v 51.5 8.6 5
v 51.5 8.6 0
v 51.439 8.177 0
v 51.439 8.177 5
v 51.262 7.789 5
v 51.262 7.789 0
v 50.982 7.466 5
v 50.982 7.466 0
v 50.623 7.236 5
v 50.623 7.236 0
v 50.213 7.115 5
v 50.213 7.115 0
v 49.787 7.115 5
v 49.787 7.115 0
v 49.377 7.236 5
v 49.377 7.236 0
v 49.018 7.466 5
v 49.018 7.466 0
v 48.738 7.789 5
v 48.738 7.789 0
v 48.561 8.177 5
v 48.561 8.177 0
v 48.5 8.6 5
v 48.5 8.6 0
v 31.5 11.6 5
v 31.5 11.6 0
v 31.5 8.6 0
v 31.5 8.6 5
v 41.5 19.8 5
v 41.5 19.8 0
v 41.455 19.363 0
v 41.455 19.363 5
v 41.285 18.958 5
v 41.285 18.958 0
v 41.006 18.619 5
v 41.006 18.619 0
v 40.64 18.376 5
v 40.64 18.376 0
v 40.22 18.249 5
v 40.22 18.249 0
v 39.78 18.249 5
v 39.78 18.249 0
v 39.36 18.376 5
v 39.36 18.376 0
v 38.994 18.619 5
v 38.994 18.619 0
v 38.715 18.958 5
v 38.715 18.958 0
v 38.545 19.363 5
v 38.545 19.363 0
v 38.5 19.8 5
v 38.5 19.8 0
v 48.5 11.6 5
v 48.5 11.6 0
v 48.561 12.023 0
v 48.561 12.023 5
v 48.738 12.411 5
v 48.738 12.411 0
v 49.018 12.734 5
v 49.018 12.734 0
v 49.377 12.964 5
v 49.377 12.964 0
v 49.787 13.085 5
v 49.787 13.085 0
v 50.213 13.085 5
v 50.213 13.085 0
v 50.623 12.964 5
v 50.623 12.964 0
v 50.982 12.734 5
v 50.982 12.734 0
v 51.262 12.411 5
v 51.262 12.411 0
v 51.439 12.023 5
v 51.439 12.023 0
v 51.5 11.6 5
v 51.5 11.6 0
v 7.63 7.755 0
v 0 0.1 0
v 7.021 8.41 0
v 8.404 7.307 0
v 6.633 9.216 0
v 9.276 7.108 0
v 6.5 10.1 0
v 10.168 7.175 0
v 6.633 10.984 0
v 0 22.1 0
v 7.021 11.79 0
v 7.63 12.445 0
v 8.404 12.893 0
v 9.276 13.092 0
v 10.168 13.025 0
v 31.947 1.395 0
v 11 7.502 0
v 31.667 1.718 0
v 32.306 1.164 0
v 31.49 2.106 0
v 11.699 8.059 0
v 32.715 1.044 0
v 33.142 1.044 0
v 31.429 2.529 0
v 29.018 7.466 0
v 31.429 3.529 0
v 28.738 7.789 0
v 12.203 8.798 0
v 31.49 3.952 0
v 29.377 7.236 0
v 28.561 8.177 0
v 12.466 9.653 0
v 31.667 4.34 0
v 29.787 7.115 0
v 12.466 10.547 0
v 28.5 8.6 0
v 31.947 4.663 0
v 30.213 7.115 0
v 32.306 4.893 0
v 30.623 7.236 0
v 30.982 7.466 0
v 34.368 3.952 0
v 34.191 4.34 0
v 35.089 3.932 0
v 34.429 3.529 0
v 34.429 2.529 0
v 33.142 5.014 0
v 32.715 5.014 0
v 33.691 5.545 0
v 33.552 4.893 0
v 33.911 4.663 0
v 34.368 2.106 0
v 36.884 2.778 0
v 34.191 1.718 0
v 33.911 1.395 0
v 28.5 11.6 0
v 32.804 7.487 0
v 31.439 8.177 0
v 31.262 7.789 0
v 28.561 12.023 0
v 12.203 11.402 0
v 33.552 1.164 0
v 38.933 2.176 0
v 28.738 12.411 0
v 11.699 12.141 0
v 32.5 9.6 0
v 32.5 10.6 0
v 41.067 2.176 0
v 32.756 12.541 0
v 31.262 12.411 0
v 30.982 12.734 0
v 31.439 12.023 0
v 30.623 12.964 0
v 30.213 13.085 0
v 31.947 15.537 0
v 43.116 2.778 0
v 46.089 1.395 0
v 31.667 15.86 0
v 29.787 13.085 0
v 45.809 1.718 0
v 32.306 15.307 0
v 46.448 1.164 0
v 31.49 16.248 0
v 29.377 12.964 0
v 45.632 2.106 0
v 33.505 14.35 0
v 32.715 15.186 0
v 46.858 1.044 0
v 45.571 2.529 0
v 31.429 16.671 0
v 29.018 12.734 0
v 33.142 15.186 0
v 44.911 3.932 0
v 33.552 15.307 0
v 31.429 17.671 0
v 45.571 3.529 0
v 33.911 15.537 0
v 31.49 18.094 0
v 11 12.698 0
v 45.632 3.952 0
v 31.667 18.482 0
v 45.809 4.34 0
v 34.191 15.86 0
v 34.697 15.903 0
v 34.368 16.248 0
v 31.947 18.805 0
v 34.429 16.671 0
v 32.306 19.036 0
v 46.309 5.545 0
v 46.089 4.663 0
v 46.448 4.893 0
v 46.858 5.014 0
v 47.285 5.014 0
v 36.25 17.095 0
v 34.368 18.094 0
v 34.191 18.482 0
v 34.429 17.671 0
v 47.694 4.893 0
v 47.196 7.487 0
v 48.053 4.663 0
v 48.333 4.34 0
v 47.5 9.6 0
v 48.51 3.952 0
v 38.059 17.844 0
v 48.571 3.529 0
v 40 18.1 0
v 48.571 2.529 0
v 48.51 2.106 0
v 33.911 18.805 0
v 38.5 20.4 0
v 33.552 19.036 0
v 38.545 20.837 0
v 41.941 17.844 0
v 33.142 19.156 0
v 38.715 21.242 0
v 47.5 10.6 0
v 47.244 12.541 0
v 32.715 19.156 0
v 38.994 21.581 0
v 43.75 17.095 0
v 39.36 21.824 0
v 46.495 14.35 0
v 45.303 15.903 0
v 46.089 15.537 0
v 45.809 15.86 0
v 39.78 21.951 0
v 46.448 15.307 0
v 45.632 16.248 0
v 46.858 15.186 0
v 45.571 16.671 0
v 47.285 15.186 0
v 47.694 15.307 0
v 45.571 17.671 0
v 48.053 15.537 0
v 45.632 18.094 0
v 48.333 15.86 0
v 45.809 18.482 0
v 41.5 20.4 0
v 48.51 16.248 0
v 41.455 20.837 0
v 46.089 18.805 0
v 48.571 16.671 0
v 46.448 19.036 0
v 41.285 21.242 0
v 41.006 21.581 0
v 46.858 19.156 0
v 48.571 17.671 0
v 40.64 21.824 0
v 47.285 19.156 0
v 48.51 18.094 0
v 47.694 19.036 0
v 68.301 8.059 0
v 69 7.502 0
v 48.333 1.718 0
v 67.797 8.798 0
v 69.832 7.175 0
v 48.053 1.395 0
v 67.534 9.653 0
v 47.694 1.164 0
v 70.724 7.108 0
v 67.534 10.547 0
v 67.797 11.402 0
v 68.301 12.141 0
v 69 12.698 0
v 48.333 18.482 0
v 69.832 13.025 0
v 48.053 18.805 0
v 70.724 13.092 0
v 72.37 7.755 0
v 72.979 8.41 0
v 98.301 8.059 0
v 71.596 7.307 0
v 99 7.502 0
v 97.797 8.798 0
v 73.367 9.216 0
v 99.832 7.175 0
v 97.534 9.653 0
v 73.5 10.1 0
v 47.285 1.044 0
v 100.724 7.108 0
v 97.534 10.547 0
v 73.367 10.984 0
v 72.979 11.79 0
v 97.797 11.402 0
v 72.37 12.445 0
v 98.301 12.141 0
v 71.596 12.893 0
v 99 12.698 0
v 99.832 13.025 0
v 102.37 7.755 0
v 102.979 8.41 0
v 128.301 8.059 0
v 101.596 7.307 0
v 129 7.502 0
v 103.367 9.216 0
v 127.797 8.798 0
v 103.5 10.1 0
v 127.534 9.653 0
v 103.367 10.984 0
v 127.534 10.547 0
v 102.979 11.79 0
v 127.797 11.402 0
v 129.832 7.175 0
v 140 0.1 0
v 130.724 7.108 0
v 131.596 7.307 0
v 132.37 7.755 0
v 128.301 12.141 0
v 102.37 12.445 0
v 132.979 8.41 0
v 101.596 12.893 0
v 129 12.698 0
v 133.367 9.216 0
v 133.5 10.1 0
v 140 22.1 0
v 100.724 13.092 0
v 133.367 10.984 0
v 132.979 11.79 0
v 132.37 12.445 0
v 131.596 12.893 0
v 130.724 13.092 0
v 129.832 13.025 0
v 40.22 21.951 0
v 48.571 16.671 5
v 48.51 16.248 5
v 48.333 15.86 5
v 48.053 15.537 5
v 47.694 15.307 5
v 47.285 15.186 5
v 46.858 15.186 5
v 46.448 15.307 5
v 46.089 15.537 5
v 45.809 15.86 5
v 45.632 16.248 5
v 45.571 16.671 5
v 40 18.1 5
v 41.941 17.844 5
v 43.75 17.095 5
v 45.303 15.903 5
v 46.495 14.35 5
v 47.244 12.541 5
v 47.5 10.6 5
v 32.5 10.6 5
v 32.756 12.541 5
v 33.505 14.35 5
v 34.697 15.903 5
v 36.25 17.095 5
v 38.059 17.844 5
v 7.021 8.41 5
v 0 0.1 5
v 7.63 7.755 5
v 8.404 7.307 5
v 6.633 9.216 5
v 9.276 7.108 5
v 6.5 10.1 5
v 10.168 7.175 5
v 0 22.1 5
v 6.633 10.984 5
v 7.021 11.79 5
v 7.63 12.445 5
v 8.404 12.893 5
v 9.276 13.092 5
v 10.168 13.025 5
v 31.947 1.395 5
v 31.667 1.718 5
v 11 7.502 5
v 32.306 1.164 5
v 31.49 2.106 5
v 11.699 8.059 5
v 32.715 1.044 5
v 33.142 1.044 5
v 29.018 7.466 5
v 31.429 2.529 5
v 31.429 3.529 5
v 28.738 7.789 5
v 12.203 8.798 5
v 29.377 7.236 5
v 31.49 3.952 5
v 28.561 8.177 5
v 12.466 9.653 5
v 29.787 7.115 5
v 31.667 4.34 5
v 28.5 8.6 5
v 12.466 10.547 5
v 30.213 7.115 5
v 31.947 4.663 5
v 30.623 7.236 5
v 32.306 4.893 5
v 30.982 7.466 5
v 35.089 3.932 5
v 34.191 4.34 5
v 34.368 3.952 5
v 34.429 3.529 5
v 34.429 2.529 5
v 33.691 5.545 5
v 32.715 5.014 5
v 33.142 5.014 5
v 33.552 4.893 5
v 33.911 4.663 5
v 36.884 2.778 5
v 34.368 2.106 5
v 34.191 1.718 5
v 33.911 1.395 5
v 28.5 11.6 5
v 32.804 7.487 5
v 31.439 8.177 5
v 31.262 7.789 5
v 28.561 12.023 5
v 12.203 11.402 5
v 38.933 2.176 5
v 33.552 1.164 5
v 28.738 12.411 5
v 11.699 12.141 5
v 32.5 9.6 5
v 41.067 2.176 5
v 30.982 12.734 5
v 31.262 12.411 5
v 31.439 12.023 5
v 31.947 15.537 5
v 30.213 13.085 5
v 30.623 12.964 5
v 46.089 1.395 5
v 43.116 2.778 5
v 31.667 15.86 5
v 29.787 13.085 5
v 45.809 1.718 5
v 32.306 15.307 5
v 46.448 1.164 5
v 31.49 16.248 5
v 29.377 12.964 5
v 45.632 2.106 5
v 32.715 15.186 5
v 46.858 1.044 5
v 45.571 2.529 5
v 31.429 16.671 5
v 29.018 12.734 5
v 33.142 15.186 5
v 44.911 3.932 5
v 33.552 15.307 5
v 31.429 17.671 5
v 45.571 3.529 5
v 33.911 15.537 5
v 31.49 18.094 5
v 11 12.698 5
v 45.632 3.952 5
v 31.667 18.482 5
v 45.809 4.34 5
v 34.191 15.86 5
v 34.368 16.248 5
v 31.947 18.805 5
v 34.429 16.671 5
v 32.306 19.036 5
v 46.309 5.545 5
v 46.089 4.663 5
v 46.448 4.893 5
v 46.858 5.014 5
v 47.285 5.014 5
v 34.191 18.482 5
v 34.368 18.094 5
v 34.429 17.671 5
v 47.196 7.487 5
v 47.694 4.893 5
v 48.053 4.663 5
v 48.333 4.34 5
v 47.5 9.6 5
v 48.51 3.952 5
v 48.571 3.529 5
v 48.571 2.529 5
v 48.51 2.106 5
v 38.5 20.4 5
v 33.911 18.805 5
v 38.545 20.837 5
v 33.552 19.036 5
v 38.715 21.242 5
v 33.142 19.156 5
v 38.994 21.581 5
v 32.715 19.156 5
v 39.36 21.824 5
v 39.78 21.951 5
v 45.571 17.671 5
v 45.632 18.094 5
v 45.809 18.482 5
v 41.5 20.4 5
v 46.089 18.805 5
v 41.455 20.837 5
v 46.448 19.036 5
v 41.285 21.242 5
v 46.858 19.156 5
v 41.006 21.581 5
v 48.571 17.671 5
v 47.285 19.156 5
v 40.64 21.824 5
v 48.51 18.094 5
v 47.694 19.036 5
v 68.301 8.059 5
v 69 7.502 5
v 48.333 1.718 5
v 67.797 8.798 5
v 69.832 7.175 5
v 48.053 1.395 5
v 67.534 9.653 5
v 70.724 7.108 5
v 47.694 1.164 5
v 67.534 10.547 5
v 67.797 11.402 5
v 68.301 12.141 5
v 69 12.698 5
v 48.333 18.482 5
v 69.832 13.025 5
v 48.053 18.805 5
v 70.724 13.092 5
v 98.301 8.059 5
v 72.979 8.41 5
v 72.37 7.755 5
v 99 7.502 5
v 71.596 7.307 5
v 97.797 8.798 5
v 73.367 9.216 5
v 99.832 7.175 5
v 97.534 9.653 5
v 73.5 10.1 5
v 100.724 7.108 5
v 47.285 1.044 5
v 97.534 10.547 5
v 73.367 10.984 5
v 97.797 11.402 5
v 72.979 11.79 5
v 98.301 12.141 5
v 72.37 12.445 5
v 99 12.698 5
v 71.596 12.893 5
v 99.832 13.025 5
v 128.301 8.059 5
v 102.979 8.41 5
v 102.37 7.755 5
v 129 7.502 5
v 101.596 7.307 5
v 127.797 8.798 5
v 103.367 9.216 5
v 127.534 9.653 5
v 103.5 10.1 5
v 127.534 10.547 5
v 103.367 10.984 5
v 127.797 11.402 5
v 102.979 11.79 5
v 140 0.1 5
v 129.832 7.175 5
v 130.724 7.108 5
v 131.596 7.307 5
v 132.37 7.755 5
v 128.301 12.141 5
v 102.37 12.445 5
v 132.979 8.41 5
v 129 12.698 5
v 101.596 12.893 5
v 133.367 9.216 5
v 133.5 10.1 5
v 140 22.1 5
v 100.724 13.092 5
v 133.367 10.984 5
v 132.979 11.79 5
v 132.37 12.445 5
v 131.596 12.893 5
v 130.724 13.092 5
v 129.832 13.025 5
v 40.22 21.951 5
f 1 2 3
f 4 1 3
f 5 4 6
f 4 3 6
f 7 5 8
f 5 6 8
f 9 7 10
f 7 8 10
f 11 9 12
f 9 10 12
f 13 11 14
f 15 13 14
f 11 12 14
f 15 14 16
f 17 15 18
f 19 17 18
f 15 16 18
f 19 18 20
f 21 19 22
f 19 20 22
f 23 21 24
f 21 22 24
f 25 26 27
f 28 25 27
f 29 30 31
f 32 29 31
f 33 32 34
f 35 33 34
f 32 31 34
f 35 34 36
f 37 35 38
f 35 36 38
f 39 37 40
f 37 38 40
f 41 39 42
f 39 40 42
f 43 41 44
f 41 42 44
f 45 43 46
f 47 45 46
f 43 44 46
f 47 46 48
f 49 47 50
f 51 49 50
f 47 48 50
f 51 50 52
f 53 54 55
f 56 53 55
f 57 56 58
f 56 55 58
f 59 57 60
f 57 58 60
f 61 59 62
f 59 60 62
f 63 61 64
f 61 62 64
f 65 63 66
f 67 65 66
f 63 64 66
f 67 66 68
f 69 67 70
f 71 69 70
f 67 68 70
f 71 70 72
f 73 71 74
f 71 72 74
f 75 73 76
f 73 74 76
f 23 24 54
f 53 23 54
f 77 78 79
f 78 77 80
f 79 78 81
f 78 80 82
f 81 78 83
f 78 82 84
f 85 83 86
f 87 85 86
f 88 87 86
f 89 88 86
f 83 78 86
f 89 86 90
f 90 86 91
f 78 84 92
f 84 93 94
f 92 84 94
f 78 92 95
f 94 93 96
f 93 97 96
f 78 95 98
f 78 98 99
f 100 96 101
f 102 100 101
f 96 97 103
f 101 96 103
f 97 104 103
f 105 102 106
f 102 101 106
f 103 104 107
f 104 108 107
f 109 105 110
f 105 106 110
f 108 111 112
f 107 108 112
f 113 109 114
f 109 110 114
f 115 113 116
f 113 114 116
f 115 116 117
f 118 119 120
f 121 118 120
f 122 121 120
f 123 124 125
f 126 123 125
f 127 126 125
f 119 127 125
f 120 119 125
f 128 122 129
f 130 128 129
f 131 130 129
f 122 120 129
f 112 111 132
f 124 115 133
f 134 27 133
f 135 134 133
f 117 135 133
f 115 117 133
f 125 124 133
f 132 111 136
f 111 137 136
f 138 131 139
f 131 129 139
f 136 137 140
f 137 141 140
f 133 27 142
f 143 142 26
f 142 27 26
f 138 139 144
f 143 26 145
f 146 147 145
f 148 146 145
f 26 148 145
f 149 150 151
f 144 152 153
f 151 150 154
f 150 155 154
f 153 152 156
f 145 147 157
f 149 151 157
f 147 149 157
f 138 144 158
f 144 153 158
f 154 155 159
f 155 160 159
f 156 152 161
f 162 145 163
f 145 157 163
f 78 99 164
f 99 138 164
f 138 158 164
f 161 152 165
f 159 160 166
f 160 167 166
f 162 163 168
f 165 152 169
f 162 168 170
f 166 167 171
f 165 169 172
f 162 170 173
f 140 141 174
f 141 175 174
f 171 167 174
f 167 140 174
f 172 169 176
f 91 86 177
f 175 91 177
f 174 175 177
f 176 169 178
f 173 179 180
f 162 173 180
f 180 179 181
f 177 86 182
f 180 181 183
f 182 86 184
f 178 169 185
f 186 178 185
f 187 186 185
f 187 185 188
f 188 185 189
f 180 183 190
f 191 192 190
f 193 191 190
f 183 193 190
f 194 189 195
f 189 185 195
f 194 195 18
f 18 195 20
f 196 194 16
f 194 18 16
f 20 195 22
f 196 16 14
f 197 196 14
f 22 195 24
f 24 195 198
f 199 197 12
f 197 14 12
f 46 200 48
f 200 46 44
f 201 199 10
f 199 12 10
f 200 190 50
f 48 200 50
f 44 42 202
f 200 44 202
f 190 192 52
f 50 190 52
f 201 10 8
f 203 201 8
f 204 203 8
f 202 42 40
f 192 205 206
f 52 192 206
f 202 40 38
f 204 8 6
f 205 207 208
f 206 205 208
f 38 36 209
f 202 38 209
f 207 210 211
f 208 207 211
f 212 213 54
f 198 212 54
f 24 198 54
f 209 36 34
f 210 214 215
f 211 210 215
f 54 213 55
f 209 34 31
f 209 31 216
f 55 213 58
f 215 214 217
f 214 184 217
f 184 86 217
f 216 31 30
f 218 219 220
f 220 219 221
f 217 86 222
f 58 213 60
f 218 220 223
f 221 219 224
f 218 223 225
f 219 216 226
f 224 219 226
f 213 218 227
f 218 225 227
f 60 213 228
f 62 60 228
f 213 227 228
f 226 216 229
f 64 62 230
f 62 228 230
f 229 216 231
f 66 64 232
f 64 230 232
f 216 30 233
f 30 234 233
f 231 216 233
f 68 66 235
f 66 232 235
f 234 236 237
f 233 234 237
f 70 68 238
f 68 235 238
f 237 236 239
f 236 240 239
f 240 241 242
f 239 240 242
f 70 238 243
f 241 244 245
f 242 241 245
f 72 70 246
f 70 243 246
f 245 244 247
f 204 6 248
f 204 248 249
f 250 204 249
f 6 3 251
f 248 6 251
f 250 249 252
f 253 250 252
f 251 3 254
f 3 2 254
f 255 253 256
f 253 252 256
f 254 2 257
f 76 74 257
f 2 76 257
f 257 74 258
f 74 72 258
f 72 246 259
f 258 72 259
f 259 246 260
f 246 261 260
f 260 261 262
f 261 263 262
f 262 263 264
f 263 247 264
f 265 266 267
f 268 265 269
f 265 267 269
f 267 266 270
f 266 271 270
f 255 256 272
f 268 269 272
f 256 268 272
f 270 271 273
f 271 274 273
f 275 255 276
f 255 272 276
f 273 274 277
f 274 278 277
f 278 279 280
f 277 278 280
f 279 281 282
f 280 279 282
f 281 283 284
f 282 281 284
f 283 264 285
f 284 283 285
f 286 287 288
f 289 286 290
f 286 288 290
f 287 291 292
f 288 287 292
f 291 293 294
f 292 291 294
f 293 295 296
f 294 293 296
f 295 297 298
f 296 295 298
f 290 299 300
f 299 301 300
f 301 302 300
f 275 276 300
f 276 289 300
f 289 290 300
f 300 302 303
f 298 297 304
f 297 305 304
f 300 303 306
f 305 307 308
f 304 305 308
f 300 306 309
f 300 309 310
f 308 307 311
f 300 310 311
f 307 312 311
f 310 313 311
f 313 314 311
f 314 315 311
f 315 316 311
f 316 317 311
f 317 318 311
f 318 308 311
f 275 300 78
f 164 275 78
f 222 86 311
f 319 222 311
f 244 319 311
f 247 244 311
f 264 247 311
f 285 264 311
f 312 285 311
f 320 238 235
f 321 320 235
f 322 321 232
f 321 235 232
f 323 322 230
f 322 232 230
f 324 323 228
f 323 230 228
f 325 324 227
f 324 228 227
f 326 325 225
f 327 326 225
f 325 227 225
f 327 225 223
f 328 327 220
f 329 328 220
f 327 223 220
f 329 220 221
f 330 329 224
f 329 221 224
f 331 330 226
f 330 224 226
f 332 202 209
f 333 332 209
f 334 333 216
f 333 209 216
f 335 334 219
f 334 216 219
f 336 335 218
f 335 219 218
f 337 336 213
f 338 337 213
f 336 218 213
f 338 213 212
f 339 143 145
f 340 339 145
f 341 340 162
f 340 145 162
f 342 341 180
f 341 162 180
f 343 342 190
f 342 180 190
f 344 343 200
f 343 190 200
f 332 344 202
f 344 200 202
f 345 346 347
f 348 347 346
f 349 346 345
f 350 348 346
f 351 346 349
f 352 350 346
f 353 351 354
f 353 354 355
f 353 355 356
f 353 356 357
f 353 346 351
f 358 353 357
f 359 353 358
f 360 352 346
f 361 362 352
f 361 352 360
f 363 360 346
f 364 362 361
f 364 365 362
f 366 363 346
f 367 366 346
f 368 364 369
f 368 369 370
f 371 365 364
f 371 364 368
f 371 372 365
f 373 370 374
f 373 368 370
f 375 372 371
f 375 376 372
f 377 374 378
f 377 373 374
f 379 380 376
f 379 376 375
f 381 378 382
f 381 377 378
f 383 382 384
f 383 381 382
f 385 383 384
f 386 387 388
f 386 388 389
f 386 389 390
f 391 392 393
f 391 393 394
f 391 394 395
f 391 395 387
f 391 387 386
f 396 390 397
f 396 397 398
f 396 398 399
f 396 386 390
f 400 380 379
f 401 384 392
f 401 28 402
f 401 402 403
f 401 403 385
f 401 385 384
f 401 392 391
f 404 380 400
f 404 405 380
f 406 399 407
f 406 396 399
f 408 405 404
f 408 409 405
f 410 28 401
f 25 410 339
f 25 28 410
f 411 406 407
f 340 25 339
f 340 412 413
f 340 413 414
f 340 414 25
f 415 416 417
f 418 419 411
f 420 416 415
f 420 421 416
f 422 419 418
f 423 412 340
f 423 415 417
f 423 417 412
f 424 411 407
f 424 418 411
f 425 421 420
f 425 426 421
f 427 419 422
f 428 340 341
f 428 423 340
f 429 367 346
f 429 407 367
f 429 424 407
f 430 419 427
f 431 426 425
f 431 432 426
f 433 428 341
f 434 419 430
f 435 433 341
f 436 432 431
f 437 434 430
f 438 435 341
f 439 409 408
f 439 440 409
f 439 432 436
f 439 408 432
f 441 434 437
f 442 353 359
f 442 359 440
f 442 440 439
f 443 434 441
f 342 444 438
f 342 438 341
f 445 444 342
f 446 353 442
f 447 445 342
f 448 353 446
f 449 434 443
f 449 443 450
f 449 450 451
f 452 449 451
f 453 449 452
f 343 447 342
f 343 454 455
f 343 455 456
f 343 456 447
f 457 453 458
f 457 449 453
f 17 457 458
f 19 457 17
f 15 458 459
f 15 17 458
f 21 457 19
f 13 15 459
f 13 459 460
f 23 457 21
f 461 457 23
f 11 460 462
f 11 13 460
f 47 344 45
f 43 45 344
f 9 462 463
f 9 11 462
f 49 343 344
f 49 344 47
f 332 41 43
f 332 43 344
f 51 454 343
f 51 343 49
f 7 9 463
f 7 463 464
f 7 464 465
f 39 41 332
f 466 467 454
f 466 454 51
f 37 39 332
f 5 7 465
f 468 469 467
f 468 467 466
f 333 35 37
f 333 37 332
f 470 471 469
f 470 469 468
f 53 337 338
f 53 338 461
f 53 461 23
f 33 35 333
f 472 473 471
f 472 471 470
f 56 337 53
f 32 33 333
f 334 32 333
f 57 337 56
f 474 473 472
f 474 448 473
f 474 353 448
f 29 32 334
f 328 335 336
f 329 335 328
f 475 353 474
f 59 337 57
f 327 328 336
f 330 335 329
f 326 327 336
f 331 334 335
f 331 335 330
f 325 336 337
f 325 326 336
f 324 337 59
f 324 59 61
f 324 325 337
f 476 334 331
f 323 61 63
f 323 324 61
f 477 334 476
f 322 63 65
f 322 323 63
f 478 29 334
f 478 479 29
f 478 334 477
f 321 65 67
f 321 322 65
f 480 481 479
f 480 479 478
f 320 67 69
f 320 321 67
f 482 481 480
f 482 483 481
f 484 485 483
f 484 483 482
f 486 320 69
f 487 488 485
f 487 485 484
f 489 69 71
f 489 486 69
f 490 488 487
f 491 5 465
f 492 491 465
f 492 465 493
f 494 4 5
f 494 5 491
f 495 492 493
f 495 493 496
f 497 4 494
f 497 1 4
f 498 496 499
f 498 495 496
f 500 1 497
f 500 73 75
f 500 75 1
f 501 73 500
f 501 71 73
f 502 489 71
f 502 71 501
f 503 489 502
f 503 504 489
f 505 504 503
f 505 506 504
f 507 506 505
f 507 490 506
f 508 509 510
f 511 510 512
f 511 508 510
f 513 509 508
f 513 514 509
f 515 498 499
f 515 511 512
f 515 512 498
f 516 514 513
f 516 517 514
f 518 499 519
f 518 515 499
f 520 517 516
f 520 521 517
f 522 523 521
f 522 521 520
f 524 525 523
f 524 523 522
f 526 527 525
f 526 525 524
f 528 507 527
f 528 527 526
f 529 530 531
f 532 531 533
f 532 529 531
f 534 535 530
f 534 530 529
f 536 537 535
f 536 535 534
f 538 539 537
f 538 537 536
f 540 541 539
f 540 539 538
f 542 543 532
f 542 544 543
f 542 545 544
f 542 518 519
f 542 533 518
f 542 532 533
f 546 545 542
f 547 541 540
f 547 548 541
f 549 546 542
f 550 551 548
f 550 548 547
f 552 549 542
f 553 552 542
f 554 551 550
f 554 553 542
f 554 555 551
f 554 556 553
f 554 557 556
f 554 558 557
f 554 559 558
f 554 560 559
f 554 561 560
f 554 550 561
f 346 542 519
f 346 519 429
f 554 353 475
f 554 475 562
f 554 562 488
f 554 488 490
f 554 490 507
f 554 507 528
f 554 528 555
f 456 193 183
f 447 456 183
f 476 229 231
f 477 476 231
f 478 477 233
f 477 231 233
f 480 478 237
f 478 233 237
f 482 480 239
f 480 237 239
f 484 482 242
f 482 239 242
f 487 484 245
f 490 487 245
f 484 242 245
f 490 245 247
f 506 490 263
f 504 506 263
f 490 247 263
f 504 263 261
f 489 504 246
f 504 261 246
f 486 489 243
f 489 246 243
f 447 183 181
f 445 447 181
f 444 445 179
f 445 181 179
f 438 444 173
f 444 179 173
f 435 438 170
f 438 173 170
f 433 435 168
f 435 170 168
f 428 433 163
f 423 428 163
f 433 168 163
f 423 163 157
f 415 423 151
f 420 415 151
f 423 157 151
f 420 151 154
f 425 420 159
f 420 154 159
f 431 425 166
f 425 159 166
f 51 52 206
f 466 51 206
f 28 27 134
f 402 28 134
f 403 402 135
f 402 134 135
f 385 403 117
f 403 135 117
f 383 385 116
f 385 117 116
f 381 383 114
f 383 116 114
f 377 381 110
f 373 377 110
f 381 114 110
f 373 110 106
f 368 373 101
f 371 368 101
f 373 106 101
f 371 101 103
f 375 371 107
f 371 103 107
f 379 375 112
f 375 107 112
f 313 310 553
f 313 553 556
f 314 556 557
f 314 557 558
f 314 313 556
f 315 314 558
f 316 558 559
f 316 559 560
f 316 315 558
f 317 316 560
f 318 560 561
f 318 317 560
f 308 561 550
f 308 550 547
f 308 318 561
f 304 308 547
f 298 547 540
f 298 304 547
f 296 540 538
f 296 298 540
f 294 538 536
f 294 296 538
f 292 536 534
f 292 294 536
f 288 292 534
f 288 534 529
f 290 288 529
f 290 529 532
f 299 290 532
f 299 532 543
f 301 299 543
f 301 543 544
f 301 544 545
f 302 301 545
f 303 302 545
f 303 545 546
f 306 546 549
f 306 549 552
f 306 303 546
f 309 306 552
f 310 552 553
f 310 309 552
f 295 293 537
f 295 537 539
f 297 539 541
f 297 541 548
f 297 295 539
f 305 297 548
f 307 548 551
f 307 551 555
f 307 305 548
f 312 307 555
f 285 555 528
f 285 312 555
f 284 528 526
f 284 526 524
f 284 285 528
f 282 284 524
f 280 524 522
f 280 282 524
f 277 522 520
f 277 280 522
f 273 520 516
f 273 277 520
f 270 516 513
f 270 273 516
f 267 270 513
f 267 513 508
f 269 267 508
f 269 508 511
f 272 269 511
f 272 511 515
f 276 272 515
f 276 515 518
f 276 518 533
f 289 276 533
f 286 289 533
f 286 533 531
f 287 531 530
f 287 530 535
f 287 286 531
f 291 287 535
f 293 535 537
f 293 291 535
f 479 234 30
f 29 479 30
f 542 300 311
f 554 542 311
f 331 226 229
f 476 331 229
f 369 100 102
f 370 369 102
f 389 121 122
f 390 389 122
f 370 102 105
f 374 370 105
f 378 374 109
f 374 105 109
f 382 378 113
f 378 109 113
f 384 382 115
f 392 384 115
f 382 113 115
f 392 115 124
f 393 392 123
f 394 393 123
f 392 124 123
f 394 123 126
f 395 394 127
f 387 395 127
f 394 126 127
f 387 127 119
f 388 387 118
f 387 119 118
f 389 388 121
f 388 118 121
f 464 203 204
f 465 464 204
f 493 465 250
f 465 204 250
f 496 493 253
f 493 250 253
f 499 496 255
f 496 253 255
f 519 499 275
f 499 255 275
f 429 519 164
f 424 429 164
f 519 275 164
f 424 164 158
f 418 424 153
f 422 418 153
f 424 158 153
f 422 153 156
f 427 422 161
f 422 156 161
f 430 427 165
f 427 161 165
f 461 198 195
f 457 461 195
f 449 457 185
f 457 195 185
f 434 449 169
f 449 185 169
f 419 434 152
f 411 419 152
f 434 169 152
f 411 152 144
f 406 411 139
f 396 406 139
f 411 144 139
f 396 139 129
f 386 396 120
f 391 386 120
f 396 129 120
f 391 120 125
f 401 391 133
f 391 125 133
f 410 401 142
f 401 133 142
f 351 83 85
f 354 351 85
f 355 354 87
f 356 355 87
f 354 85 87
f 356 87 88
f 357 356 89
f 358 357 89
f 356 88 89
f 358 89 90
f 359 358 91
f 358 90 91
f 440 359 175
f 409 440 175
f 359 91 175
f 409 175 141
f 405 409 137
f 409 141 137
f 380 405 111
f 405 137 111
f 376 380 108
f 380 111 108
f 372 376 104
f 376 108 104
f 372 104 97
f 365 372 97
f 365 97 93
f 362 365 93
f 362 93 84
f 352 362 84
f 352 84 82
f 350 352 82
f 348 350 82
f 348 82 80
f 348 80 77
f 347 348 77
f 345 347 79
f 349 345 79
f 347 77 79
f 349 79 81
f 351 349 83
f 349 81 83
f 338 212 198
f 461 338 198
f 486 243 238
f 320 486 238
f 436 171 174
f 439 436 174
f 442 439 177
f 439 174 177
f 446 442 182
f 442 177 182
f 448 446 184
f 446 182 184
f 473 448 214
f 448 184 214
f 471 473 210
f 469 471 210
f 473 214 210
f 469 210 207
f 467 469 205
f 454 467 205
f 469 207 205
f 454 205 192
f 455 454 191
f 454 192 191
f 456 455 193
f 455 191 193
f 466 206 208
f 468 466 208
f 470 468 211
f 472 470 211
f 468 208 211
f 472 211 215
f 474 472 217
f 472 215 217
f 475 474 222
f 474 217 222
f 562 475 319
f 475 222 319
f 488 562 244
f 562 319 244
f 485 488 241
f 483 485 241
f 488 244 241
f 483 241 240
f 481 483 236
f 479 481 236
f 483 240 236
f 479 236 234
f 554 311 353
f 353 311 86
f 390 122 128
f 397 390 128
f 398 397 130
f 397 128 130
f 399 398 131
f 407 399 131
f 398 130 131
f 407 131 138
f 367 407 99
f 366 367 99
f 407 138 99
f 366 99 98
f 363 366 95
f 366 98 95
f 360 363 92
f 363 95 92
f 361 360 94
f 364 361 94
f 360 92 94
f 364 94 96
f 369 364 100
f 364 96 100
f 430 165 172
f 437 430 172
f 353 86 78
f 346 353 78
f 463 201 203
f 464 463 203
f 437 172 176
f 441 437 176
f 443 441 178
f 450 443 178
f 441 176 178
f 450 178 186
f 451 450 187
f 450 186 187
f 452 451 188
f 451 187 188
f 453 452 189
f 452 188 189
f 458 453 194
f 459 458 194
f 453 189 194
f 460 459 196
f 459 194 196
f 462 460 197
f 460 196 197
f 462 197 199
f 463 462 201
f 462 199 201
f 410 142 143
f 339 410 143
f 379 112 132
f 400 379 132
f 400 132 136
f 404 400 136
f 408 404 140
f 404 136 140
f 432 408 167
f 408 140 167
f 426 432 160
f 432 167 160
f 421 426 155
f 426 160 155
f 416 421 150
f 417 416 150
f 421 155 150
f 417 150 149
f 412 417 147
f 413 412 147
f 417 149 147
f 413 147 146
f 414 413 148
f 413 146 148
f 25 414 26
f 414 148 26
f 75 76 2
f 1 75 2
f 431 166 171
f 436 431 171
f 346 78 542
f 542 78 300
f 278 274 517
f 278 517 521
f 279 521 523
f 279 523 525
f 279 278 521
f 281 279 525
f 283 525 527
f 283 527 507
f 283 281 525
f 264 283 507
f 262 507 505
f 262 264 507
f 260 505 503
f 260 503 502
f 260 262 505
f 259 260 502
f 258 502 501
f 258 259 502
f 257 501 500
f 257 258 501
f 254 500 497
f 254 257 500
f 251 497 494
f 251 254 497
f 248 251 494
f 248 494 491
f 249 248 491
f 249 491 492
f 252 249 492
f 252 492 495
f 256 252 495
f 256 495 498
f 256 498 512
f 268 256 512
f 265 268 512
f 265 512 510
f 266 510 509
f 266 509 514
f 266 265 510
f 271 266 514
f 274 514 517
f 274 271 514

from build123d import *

# Parameters (mm, degrees)
SKETCH_1_R      = 3
EXTRUDE_1_DEPTH = 5


with BuildPart() as part:
    # 스케치1 → 보스-돌출1 (new body)
    with BuildSketch(Plane.XY):
        Polygon((0, 22.1), (0, 10.1), (0, 0.1), (140, 0.1), (140, 10.1), (140, 22.1), align=None)
        with BuildLine():
            Line((31.428932188, 2.528932188), (31.428932188, 3.028932188))
            Line((31.428932188, 3.028932188), (31.428932188, 3.528932188))
            ThreePointArc((31.428932188, 3.528932188), (32.928932188, 5.028932188), (34.428932188, 3.528932188))
            Line((34.428932188, 3.528932188), (34.428932188, 3.028932188))
            Line((34.428932188, 3.028932188), (34.428932188, 2.528932188))
            ThreePointArc((34.428932188, 2.528932188), (32.928932188, 1.028932188), (31.428932188, 2.528932188))
        make_face(mode=Mode.SUBTRACT)
        with BuildLine():
            Line((48.571067812, 3.528932188), (48.571067812, 3.028932188))
            Line((48.571067812, 3.028932188), (48.571067812, 2.528932188))
            ThreePointArc((48.571067812, 2.528932188), (47.071067812, 1.028932188), (45.571067812, 2.528932188))
            Line((45.571067812, 2.528932188), (45.571067812, 3.028932188))
            Line((45.571067812, 3.028932188), (45.571067812, 3.528932188))
            ThreePointArc((45.571067812, 3.528932188), (47.071067812, 5.028932188), (48.571067812, 3.528932188))
        make_face(mode=Mode.SUBTRACT)
        with BuildLine():
            ThreePointArc((12.5, 10.1), (9.5, 7.1), (6.5, 10.1))
            ThreePointArc((6.5, 10.1), (9.5, 13.1), (12.5, 10.1))
        make_face(mode=Mode.SUBTRACT)
        with BuildLine():
            Line((28.5, 8.6), (28.5, 10.1))
            Line((28.5, 10.1), (28.5, 11.6))
            ThreePointArc((28.5, 11.6), (30, 13.1), (31.5, 11.6))
            Line((31.5, 11.6), (31.5, 10.1))
            Line((31.5, 10.1), (31.5, 8.6))
            ThreePointArc((31.5, 8.6), (30, 7.1), (28.5, 8.6))
        make_face(mode=Mode.SUBTRACT)
        with BuildLine():
            Line((32.5, 9.6), (32.5, 10.1))
            Line((32.5, 10.1), (32.5, 10.6))
            ThreePointArc((32.5, 10.6), (34.696699141, 15.903300859), (40, 18.1))
            ThreePointArc((40, 18.1), (45.303300859, 15.903300859), (47.5, 10.6))
            Line((47.5, 10.6), (47.5, 10.1))
            Line((47.5, 10.1), (47.5, 9.6))
            ThreePointArc((47.5, 9.6), (40, 2.1), (32.5, 9.6))
        make_face(mode=Mode.SUBTRACT)
        with BuildLine():
            Line((51.5, 11.6), (51.5, 10.1))
            Line((51.5, 10.1), (51.5, 8.6))
            ThreePointArc((51.5, 8.6), (50, 7.1), (48.5, 8.6))
            Line((48.5, 8.6), (48.5, 10.1))
            Line((48.5, 10.1), (48.5, 11.6))
            ThreePointArc((48.5, 11.6), (50, 13.1), (51.5, 11.6))
        make_face(mode=Mode.SUBTRACT)
        with Locations((70.5, 10.1)):
            Circle(SKETCH_1_R, mode=Mode.SUBTRACT)
        with Locations((100.5, 10.1)):
            Circle(SKETCH_1_R, mode=Mode.SUBTRACT)
        with Locations((130.5, 10.1)):
            Circle(SKETCH_1_R, mode=Mode.SUBTRACT)
        with BuildLine():
            Line((31.428932188, 16.671067812), (31.428932188, 17.171067812))
            Line((31.428932188, 17.171067812), (31.428932188, 17.671067812))
            ThreePointArc((31.428932188, 17.671067812), (32.928932188, 19.171067812), (34.428932188, 17.671067812))
            Line((34.428932188, 17.671067812), (34.428932188, 17.171067812))
            Line((34.428932188, 17.171067812), (34.428932188, 16.671067812))
            ThreePointArc((34.428932188, 16.671067812), (32.928932188, 15.171067812), (31.428932188, 16.671067812))
        make_face(mode=Mode.SUBTRACT)
        with BuildLine():
            Line((45.571067812, 16.671067812), (45.571067812, 17.171067812))
            Line((45.571067812, 17.171067812), (45.571067812, 17.671067812))
            ThreePointArc((45.571067812, 17.671067812), (47.071067812, 19.171067812), (48.571067812, 17.671067812))
            Line((48.571067812, 17.671067812), (48.571067812, 17.171067812))
            Line((48.571067812, 17.171067812), (48.571067812, 16.671067812))
            ThreePointArc((48.571067812, 16.671067812), (47.071067812, 15.171067812), (45.571067812, 16.671067812))
        make_face(mode=Mode.SUBTRACT)
        with BuildLine():
            Line((38.5, 19.8), (38.5, 20.1))
            Line((38.5, 20.1), (38.5, 20.4))
            ThreePointArc((38.5, 20.4), (40, 21.967353054), (41.5, 20.4))
            Line((41.5, 20.4), (41.5, 20.1))
            Line((41.5, 20.1), (41.5, 19.8))
            ThreePointArc((41.5, 19.8), (40, 18.232646946), (38.5, 19.8))
        make_face(mode=Mode.SUBTRACT)
    extrude(amount=EXTRUDE_1_DEPTH)


solid = part.part
